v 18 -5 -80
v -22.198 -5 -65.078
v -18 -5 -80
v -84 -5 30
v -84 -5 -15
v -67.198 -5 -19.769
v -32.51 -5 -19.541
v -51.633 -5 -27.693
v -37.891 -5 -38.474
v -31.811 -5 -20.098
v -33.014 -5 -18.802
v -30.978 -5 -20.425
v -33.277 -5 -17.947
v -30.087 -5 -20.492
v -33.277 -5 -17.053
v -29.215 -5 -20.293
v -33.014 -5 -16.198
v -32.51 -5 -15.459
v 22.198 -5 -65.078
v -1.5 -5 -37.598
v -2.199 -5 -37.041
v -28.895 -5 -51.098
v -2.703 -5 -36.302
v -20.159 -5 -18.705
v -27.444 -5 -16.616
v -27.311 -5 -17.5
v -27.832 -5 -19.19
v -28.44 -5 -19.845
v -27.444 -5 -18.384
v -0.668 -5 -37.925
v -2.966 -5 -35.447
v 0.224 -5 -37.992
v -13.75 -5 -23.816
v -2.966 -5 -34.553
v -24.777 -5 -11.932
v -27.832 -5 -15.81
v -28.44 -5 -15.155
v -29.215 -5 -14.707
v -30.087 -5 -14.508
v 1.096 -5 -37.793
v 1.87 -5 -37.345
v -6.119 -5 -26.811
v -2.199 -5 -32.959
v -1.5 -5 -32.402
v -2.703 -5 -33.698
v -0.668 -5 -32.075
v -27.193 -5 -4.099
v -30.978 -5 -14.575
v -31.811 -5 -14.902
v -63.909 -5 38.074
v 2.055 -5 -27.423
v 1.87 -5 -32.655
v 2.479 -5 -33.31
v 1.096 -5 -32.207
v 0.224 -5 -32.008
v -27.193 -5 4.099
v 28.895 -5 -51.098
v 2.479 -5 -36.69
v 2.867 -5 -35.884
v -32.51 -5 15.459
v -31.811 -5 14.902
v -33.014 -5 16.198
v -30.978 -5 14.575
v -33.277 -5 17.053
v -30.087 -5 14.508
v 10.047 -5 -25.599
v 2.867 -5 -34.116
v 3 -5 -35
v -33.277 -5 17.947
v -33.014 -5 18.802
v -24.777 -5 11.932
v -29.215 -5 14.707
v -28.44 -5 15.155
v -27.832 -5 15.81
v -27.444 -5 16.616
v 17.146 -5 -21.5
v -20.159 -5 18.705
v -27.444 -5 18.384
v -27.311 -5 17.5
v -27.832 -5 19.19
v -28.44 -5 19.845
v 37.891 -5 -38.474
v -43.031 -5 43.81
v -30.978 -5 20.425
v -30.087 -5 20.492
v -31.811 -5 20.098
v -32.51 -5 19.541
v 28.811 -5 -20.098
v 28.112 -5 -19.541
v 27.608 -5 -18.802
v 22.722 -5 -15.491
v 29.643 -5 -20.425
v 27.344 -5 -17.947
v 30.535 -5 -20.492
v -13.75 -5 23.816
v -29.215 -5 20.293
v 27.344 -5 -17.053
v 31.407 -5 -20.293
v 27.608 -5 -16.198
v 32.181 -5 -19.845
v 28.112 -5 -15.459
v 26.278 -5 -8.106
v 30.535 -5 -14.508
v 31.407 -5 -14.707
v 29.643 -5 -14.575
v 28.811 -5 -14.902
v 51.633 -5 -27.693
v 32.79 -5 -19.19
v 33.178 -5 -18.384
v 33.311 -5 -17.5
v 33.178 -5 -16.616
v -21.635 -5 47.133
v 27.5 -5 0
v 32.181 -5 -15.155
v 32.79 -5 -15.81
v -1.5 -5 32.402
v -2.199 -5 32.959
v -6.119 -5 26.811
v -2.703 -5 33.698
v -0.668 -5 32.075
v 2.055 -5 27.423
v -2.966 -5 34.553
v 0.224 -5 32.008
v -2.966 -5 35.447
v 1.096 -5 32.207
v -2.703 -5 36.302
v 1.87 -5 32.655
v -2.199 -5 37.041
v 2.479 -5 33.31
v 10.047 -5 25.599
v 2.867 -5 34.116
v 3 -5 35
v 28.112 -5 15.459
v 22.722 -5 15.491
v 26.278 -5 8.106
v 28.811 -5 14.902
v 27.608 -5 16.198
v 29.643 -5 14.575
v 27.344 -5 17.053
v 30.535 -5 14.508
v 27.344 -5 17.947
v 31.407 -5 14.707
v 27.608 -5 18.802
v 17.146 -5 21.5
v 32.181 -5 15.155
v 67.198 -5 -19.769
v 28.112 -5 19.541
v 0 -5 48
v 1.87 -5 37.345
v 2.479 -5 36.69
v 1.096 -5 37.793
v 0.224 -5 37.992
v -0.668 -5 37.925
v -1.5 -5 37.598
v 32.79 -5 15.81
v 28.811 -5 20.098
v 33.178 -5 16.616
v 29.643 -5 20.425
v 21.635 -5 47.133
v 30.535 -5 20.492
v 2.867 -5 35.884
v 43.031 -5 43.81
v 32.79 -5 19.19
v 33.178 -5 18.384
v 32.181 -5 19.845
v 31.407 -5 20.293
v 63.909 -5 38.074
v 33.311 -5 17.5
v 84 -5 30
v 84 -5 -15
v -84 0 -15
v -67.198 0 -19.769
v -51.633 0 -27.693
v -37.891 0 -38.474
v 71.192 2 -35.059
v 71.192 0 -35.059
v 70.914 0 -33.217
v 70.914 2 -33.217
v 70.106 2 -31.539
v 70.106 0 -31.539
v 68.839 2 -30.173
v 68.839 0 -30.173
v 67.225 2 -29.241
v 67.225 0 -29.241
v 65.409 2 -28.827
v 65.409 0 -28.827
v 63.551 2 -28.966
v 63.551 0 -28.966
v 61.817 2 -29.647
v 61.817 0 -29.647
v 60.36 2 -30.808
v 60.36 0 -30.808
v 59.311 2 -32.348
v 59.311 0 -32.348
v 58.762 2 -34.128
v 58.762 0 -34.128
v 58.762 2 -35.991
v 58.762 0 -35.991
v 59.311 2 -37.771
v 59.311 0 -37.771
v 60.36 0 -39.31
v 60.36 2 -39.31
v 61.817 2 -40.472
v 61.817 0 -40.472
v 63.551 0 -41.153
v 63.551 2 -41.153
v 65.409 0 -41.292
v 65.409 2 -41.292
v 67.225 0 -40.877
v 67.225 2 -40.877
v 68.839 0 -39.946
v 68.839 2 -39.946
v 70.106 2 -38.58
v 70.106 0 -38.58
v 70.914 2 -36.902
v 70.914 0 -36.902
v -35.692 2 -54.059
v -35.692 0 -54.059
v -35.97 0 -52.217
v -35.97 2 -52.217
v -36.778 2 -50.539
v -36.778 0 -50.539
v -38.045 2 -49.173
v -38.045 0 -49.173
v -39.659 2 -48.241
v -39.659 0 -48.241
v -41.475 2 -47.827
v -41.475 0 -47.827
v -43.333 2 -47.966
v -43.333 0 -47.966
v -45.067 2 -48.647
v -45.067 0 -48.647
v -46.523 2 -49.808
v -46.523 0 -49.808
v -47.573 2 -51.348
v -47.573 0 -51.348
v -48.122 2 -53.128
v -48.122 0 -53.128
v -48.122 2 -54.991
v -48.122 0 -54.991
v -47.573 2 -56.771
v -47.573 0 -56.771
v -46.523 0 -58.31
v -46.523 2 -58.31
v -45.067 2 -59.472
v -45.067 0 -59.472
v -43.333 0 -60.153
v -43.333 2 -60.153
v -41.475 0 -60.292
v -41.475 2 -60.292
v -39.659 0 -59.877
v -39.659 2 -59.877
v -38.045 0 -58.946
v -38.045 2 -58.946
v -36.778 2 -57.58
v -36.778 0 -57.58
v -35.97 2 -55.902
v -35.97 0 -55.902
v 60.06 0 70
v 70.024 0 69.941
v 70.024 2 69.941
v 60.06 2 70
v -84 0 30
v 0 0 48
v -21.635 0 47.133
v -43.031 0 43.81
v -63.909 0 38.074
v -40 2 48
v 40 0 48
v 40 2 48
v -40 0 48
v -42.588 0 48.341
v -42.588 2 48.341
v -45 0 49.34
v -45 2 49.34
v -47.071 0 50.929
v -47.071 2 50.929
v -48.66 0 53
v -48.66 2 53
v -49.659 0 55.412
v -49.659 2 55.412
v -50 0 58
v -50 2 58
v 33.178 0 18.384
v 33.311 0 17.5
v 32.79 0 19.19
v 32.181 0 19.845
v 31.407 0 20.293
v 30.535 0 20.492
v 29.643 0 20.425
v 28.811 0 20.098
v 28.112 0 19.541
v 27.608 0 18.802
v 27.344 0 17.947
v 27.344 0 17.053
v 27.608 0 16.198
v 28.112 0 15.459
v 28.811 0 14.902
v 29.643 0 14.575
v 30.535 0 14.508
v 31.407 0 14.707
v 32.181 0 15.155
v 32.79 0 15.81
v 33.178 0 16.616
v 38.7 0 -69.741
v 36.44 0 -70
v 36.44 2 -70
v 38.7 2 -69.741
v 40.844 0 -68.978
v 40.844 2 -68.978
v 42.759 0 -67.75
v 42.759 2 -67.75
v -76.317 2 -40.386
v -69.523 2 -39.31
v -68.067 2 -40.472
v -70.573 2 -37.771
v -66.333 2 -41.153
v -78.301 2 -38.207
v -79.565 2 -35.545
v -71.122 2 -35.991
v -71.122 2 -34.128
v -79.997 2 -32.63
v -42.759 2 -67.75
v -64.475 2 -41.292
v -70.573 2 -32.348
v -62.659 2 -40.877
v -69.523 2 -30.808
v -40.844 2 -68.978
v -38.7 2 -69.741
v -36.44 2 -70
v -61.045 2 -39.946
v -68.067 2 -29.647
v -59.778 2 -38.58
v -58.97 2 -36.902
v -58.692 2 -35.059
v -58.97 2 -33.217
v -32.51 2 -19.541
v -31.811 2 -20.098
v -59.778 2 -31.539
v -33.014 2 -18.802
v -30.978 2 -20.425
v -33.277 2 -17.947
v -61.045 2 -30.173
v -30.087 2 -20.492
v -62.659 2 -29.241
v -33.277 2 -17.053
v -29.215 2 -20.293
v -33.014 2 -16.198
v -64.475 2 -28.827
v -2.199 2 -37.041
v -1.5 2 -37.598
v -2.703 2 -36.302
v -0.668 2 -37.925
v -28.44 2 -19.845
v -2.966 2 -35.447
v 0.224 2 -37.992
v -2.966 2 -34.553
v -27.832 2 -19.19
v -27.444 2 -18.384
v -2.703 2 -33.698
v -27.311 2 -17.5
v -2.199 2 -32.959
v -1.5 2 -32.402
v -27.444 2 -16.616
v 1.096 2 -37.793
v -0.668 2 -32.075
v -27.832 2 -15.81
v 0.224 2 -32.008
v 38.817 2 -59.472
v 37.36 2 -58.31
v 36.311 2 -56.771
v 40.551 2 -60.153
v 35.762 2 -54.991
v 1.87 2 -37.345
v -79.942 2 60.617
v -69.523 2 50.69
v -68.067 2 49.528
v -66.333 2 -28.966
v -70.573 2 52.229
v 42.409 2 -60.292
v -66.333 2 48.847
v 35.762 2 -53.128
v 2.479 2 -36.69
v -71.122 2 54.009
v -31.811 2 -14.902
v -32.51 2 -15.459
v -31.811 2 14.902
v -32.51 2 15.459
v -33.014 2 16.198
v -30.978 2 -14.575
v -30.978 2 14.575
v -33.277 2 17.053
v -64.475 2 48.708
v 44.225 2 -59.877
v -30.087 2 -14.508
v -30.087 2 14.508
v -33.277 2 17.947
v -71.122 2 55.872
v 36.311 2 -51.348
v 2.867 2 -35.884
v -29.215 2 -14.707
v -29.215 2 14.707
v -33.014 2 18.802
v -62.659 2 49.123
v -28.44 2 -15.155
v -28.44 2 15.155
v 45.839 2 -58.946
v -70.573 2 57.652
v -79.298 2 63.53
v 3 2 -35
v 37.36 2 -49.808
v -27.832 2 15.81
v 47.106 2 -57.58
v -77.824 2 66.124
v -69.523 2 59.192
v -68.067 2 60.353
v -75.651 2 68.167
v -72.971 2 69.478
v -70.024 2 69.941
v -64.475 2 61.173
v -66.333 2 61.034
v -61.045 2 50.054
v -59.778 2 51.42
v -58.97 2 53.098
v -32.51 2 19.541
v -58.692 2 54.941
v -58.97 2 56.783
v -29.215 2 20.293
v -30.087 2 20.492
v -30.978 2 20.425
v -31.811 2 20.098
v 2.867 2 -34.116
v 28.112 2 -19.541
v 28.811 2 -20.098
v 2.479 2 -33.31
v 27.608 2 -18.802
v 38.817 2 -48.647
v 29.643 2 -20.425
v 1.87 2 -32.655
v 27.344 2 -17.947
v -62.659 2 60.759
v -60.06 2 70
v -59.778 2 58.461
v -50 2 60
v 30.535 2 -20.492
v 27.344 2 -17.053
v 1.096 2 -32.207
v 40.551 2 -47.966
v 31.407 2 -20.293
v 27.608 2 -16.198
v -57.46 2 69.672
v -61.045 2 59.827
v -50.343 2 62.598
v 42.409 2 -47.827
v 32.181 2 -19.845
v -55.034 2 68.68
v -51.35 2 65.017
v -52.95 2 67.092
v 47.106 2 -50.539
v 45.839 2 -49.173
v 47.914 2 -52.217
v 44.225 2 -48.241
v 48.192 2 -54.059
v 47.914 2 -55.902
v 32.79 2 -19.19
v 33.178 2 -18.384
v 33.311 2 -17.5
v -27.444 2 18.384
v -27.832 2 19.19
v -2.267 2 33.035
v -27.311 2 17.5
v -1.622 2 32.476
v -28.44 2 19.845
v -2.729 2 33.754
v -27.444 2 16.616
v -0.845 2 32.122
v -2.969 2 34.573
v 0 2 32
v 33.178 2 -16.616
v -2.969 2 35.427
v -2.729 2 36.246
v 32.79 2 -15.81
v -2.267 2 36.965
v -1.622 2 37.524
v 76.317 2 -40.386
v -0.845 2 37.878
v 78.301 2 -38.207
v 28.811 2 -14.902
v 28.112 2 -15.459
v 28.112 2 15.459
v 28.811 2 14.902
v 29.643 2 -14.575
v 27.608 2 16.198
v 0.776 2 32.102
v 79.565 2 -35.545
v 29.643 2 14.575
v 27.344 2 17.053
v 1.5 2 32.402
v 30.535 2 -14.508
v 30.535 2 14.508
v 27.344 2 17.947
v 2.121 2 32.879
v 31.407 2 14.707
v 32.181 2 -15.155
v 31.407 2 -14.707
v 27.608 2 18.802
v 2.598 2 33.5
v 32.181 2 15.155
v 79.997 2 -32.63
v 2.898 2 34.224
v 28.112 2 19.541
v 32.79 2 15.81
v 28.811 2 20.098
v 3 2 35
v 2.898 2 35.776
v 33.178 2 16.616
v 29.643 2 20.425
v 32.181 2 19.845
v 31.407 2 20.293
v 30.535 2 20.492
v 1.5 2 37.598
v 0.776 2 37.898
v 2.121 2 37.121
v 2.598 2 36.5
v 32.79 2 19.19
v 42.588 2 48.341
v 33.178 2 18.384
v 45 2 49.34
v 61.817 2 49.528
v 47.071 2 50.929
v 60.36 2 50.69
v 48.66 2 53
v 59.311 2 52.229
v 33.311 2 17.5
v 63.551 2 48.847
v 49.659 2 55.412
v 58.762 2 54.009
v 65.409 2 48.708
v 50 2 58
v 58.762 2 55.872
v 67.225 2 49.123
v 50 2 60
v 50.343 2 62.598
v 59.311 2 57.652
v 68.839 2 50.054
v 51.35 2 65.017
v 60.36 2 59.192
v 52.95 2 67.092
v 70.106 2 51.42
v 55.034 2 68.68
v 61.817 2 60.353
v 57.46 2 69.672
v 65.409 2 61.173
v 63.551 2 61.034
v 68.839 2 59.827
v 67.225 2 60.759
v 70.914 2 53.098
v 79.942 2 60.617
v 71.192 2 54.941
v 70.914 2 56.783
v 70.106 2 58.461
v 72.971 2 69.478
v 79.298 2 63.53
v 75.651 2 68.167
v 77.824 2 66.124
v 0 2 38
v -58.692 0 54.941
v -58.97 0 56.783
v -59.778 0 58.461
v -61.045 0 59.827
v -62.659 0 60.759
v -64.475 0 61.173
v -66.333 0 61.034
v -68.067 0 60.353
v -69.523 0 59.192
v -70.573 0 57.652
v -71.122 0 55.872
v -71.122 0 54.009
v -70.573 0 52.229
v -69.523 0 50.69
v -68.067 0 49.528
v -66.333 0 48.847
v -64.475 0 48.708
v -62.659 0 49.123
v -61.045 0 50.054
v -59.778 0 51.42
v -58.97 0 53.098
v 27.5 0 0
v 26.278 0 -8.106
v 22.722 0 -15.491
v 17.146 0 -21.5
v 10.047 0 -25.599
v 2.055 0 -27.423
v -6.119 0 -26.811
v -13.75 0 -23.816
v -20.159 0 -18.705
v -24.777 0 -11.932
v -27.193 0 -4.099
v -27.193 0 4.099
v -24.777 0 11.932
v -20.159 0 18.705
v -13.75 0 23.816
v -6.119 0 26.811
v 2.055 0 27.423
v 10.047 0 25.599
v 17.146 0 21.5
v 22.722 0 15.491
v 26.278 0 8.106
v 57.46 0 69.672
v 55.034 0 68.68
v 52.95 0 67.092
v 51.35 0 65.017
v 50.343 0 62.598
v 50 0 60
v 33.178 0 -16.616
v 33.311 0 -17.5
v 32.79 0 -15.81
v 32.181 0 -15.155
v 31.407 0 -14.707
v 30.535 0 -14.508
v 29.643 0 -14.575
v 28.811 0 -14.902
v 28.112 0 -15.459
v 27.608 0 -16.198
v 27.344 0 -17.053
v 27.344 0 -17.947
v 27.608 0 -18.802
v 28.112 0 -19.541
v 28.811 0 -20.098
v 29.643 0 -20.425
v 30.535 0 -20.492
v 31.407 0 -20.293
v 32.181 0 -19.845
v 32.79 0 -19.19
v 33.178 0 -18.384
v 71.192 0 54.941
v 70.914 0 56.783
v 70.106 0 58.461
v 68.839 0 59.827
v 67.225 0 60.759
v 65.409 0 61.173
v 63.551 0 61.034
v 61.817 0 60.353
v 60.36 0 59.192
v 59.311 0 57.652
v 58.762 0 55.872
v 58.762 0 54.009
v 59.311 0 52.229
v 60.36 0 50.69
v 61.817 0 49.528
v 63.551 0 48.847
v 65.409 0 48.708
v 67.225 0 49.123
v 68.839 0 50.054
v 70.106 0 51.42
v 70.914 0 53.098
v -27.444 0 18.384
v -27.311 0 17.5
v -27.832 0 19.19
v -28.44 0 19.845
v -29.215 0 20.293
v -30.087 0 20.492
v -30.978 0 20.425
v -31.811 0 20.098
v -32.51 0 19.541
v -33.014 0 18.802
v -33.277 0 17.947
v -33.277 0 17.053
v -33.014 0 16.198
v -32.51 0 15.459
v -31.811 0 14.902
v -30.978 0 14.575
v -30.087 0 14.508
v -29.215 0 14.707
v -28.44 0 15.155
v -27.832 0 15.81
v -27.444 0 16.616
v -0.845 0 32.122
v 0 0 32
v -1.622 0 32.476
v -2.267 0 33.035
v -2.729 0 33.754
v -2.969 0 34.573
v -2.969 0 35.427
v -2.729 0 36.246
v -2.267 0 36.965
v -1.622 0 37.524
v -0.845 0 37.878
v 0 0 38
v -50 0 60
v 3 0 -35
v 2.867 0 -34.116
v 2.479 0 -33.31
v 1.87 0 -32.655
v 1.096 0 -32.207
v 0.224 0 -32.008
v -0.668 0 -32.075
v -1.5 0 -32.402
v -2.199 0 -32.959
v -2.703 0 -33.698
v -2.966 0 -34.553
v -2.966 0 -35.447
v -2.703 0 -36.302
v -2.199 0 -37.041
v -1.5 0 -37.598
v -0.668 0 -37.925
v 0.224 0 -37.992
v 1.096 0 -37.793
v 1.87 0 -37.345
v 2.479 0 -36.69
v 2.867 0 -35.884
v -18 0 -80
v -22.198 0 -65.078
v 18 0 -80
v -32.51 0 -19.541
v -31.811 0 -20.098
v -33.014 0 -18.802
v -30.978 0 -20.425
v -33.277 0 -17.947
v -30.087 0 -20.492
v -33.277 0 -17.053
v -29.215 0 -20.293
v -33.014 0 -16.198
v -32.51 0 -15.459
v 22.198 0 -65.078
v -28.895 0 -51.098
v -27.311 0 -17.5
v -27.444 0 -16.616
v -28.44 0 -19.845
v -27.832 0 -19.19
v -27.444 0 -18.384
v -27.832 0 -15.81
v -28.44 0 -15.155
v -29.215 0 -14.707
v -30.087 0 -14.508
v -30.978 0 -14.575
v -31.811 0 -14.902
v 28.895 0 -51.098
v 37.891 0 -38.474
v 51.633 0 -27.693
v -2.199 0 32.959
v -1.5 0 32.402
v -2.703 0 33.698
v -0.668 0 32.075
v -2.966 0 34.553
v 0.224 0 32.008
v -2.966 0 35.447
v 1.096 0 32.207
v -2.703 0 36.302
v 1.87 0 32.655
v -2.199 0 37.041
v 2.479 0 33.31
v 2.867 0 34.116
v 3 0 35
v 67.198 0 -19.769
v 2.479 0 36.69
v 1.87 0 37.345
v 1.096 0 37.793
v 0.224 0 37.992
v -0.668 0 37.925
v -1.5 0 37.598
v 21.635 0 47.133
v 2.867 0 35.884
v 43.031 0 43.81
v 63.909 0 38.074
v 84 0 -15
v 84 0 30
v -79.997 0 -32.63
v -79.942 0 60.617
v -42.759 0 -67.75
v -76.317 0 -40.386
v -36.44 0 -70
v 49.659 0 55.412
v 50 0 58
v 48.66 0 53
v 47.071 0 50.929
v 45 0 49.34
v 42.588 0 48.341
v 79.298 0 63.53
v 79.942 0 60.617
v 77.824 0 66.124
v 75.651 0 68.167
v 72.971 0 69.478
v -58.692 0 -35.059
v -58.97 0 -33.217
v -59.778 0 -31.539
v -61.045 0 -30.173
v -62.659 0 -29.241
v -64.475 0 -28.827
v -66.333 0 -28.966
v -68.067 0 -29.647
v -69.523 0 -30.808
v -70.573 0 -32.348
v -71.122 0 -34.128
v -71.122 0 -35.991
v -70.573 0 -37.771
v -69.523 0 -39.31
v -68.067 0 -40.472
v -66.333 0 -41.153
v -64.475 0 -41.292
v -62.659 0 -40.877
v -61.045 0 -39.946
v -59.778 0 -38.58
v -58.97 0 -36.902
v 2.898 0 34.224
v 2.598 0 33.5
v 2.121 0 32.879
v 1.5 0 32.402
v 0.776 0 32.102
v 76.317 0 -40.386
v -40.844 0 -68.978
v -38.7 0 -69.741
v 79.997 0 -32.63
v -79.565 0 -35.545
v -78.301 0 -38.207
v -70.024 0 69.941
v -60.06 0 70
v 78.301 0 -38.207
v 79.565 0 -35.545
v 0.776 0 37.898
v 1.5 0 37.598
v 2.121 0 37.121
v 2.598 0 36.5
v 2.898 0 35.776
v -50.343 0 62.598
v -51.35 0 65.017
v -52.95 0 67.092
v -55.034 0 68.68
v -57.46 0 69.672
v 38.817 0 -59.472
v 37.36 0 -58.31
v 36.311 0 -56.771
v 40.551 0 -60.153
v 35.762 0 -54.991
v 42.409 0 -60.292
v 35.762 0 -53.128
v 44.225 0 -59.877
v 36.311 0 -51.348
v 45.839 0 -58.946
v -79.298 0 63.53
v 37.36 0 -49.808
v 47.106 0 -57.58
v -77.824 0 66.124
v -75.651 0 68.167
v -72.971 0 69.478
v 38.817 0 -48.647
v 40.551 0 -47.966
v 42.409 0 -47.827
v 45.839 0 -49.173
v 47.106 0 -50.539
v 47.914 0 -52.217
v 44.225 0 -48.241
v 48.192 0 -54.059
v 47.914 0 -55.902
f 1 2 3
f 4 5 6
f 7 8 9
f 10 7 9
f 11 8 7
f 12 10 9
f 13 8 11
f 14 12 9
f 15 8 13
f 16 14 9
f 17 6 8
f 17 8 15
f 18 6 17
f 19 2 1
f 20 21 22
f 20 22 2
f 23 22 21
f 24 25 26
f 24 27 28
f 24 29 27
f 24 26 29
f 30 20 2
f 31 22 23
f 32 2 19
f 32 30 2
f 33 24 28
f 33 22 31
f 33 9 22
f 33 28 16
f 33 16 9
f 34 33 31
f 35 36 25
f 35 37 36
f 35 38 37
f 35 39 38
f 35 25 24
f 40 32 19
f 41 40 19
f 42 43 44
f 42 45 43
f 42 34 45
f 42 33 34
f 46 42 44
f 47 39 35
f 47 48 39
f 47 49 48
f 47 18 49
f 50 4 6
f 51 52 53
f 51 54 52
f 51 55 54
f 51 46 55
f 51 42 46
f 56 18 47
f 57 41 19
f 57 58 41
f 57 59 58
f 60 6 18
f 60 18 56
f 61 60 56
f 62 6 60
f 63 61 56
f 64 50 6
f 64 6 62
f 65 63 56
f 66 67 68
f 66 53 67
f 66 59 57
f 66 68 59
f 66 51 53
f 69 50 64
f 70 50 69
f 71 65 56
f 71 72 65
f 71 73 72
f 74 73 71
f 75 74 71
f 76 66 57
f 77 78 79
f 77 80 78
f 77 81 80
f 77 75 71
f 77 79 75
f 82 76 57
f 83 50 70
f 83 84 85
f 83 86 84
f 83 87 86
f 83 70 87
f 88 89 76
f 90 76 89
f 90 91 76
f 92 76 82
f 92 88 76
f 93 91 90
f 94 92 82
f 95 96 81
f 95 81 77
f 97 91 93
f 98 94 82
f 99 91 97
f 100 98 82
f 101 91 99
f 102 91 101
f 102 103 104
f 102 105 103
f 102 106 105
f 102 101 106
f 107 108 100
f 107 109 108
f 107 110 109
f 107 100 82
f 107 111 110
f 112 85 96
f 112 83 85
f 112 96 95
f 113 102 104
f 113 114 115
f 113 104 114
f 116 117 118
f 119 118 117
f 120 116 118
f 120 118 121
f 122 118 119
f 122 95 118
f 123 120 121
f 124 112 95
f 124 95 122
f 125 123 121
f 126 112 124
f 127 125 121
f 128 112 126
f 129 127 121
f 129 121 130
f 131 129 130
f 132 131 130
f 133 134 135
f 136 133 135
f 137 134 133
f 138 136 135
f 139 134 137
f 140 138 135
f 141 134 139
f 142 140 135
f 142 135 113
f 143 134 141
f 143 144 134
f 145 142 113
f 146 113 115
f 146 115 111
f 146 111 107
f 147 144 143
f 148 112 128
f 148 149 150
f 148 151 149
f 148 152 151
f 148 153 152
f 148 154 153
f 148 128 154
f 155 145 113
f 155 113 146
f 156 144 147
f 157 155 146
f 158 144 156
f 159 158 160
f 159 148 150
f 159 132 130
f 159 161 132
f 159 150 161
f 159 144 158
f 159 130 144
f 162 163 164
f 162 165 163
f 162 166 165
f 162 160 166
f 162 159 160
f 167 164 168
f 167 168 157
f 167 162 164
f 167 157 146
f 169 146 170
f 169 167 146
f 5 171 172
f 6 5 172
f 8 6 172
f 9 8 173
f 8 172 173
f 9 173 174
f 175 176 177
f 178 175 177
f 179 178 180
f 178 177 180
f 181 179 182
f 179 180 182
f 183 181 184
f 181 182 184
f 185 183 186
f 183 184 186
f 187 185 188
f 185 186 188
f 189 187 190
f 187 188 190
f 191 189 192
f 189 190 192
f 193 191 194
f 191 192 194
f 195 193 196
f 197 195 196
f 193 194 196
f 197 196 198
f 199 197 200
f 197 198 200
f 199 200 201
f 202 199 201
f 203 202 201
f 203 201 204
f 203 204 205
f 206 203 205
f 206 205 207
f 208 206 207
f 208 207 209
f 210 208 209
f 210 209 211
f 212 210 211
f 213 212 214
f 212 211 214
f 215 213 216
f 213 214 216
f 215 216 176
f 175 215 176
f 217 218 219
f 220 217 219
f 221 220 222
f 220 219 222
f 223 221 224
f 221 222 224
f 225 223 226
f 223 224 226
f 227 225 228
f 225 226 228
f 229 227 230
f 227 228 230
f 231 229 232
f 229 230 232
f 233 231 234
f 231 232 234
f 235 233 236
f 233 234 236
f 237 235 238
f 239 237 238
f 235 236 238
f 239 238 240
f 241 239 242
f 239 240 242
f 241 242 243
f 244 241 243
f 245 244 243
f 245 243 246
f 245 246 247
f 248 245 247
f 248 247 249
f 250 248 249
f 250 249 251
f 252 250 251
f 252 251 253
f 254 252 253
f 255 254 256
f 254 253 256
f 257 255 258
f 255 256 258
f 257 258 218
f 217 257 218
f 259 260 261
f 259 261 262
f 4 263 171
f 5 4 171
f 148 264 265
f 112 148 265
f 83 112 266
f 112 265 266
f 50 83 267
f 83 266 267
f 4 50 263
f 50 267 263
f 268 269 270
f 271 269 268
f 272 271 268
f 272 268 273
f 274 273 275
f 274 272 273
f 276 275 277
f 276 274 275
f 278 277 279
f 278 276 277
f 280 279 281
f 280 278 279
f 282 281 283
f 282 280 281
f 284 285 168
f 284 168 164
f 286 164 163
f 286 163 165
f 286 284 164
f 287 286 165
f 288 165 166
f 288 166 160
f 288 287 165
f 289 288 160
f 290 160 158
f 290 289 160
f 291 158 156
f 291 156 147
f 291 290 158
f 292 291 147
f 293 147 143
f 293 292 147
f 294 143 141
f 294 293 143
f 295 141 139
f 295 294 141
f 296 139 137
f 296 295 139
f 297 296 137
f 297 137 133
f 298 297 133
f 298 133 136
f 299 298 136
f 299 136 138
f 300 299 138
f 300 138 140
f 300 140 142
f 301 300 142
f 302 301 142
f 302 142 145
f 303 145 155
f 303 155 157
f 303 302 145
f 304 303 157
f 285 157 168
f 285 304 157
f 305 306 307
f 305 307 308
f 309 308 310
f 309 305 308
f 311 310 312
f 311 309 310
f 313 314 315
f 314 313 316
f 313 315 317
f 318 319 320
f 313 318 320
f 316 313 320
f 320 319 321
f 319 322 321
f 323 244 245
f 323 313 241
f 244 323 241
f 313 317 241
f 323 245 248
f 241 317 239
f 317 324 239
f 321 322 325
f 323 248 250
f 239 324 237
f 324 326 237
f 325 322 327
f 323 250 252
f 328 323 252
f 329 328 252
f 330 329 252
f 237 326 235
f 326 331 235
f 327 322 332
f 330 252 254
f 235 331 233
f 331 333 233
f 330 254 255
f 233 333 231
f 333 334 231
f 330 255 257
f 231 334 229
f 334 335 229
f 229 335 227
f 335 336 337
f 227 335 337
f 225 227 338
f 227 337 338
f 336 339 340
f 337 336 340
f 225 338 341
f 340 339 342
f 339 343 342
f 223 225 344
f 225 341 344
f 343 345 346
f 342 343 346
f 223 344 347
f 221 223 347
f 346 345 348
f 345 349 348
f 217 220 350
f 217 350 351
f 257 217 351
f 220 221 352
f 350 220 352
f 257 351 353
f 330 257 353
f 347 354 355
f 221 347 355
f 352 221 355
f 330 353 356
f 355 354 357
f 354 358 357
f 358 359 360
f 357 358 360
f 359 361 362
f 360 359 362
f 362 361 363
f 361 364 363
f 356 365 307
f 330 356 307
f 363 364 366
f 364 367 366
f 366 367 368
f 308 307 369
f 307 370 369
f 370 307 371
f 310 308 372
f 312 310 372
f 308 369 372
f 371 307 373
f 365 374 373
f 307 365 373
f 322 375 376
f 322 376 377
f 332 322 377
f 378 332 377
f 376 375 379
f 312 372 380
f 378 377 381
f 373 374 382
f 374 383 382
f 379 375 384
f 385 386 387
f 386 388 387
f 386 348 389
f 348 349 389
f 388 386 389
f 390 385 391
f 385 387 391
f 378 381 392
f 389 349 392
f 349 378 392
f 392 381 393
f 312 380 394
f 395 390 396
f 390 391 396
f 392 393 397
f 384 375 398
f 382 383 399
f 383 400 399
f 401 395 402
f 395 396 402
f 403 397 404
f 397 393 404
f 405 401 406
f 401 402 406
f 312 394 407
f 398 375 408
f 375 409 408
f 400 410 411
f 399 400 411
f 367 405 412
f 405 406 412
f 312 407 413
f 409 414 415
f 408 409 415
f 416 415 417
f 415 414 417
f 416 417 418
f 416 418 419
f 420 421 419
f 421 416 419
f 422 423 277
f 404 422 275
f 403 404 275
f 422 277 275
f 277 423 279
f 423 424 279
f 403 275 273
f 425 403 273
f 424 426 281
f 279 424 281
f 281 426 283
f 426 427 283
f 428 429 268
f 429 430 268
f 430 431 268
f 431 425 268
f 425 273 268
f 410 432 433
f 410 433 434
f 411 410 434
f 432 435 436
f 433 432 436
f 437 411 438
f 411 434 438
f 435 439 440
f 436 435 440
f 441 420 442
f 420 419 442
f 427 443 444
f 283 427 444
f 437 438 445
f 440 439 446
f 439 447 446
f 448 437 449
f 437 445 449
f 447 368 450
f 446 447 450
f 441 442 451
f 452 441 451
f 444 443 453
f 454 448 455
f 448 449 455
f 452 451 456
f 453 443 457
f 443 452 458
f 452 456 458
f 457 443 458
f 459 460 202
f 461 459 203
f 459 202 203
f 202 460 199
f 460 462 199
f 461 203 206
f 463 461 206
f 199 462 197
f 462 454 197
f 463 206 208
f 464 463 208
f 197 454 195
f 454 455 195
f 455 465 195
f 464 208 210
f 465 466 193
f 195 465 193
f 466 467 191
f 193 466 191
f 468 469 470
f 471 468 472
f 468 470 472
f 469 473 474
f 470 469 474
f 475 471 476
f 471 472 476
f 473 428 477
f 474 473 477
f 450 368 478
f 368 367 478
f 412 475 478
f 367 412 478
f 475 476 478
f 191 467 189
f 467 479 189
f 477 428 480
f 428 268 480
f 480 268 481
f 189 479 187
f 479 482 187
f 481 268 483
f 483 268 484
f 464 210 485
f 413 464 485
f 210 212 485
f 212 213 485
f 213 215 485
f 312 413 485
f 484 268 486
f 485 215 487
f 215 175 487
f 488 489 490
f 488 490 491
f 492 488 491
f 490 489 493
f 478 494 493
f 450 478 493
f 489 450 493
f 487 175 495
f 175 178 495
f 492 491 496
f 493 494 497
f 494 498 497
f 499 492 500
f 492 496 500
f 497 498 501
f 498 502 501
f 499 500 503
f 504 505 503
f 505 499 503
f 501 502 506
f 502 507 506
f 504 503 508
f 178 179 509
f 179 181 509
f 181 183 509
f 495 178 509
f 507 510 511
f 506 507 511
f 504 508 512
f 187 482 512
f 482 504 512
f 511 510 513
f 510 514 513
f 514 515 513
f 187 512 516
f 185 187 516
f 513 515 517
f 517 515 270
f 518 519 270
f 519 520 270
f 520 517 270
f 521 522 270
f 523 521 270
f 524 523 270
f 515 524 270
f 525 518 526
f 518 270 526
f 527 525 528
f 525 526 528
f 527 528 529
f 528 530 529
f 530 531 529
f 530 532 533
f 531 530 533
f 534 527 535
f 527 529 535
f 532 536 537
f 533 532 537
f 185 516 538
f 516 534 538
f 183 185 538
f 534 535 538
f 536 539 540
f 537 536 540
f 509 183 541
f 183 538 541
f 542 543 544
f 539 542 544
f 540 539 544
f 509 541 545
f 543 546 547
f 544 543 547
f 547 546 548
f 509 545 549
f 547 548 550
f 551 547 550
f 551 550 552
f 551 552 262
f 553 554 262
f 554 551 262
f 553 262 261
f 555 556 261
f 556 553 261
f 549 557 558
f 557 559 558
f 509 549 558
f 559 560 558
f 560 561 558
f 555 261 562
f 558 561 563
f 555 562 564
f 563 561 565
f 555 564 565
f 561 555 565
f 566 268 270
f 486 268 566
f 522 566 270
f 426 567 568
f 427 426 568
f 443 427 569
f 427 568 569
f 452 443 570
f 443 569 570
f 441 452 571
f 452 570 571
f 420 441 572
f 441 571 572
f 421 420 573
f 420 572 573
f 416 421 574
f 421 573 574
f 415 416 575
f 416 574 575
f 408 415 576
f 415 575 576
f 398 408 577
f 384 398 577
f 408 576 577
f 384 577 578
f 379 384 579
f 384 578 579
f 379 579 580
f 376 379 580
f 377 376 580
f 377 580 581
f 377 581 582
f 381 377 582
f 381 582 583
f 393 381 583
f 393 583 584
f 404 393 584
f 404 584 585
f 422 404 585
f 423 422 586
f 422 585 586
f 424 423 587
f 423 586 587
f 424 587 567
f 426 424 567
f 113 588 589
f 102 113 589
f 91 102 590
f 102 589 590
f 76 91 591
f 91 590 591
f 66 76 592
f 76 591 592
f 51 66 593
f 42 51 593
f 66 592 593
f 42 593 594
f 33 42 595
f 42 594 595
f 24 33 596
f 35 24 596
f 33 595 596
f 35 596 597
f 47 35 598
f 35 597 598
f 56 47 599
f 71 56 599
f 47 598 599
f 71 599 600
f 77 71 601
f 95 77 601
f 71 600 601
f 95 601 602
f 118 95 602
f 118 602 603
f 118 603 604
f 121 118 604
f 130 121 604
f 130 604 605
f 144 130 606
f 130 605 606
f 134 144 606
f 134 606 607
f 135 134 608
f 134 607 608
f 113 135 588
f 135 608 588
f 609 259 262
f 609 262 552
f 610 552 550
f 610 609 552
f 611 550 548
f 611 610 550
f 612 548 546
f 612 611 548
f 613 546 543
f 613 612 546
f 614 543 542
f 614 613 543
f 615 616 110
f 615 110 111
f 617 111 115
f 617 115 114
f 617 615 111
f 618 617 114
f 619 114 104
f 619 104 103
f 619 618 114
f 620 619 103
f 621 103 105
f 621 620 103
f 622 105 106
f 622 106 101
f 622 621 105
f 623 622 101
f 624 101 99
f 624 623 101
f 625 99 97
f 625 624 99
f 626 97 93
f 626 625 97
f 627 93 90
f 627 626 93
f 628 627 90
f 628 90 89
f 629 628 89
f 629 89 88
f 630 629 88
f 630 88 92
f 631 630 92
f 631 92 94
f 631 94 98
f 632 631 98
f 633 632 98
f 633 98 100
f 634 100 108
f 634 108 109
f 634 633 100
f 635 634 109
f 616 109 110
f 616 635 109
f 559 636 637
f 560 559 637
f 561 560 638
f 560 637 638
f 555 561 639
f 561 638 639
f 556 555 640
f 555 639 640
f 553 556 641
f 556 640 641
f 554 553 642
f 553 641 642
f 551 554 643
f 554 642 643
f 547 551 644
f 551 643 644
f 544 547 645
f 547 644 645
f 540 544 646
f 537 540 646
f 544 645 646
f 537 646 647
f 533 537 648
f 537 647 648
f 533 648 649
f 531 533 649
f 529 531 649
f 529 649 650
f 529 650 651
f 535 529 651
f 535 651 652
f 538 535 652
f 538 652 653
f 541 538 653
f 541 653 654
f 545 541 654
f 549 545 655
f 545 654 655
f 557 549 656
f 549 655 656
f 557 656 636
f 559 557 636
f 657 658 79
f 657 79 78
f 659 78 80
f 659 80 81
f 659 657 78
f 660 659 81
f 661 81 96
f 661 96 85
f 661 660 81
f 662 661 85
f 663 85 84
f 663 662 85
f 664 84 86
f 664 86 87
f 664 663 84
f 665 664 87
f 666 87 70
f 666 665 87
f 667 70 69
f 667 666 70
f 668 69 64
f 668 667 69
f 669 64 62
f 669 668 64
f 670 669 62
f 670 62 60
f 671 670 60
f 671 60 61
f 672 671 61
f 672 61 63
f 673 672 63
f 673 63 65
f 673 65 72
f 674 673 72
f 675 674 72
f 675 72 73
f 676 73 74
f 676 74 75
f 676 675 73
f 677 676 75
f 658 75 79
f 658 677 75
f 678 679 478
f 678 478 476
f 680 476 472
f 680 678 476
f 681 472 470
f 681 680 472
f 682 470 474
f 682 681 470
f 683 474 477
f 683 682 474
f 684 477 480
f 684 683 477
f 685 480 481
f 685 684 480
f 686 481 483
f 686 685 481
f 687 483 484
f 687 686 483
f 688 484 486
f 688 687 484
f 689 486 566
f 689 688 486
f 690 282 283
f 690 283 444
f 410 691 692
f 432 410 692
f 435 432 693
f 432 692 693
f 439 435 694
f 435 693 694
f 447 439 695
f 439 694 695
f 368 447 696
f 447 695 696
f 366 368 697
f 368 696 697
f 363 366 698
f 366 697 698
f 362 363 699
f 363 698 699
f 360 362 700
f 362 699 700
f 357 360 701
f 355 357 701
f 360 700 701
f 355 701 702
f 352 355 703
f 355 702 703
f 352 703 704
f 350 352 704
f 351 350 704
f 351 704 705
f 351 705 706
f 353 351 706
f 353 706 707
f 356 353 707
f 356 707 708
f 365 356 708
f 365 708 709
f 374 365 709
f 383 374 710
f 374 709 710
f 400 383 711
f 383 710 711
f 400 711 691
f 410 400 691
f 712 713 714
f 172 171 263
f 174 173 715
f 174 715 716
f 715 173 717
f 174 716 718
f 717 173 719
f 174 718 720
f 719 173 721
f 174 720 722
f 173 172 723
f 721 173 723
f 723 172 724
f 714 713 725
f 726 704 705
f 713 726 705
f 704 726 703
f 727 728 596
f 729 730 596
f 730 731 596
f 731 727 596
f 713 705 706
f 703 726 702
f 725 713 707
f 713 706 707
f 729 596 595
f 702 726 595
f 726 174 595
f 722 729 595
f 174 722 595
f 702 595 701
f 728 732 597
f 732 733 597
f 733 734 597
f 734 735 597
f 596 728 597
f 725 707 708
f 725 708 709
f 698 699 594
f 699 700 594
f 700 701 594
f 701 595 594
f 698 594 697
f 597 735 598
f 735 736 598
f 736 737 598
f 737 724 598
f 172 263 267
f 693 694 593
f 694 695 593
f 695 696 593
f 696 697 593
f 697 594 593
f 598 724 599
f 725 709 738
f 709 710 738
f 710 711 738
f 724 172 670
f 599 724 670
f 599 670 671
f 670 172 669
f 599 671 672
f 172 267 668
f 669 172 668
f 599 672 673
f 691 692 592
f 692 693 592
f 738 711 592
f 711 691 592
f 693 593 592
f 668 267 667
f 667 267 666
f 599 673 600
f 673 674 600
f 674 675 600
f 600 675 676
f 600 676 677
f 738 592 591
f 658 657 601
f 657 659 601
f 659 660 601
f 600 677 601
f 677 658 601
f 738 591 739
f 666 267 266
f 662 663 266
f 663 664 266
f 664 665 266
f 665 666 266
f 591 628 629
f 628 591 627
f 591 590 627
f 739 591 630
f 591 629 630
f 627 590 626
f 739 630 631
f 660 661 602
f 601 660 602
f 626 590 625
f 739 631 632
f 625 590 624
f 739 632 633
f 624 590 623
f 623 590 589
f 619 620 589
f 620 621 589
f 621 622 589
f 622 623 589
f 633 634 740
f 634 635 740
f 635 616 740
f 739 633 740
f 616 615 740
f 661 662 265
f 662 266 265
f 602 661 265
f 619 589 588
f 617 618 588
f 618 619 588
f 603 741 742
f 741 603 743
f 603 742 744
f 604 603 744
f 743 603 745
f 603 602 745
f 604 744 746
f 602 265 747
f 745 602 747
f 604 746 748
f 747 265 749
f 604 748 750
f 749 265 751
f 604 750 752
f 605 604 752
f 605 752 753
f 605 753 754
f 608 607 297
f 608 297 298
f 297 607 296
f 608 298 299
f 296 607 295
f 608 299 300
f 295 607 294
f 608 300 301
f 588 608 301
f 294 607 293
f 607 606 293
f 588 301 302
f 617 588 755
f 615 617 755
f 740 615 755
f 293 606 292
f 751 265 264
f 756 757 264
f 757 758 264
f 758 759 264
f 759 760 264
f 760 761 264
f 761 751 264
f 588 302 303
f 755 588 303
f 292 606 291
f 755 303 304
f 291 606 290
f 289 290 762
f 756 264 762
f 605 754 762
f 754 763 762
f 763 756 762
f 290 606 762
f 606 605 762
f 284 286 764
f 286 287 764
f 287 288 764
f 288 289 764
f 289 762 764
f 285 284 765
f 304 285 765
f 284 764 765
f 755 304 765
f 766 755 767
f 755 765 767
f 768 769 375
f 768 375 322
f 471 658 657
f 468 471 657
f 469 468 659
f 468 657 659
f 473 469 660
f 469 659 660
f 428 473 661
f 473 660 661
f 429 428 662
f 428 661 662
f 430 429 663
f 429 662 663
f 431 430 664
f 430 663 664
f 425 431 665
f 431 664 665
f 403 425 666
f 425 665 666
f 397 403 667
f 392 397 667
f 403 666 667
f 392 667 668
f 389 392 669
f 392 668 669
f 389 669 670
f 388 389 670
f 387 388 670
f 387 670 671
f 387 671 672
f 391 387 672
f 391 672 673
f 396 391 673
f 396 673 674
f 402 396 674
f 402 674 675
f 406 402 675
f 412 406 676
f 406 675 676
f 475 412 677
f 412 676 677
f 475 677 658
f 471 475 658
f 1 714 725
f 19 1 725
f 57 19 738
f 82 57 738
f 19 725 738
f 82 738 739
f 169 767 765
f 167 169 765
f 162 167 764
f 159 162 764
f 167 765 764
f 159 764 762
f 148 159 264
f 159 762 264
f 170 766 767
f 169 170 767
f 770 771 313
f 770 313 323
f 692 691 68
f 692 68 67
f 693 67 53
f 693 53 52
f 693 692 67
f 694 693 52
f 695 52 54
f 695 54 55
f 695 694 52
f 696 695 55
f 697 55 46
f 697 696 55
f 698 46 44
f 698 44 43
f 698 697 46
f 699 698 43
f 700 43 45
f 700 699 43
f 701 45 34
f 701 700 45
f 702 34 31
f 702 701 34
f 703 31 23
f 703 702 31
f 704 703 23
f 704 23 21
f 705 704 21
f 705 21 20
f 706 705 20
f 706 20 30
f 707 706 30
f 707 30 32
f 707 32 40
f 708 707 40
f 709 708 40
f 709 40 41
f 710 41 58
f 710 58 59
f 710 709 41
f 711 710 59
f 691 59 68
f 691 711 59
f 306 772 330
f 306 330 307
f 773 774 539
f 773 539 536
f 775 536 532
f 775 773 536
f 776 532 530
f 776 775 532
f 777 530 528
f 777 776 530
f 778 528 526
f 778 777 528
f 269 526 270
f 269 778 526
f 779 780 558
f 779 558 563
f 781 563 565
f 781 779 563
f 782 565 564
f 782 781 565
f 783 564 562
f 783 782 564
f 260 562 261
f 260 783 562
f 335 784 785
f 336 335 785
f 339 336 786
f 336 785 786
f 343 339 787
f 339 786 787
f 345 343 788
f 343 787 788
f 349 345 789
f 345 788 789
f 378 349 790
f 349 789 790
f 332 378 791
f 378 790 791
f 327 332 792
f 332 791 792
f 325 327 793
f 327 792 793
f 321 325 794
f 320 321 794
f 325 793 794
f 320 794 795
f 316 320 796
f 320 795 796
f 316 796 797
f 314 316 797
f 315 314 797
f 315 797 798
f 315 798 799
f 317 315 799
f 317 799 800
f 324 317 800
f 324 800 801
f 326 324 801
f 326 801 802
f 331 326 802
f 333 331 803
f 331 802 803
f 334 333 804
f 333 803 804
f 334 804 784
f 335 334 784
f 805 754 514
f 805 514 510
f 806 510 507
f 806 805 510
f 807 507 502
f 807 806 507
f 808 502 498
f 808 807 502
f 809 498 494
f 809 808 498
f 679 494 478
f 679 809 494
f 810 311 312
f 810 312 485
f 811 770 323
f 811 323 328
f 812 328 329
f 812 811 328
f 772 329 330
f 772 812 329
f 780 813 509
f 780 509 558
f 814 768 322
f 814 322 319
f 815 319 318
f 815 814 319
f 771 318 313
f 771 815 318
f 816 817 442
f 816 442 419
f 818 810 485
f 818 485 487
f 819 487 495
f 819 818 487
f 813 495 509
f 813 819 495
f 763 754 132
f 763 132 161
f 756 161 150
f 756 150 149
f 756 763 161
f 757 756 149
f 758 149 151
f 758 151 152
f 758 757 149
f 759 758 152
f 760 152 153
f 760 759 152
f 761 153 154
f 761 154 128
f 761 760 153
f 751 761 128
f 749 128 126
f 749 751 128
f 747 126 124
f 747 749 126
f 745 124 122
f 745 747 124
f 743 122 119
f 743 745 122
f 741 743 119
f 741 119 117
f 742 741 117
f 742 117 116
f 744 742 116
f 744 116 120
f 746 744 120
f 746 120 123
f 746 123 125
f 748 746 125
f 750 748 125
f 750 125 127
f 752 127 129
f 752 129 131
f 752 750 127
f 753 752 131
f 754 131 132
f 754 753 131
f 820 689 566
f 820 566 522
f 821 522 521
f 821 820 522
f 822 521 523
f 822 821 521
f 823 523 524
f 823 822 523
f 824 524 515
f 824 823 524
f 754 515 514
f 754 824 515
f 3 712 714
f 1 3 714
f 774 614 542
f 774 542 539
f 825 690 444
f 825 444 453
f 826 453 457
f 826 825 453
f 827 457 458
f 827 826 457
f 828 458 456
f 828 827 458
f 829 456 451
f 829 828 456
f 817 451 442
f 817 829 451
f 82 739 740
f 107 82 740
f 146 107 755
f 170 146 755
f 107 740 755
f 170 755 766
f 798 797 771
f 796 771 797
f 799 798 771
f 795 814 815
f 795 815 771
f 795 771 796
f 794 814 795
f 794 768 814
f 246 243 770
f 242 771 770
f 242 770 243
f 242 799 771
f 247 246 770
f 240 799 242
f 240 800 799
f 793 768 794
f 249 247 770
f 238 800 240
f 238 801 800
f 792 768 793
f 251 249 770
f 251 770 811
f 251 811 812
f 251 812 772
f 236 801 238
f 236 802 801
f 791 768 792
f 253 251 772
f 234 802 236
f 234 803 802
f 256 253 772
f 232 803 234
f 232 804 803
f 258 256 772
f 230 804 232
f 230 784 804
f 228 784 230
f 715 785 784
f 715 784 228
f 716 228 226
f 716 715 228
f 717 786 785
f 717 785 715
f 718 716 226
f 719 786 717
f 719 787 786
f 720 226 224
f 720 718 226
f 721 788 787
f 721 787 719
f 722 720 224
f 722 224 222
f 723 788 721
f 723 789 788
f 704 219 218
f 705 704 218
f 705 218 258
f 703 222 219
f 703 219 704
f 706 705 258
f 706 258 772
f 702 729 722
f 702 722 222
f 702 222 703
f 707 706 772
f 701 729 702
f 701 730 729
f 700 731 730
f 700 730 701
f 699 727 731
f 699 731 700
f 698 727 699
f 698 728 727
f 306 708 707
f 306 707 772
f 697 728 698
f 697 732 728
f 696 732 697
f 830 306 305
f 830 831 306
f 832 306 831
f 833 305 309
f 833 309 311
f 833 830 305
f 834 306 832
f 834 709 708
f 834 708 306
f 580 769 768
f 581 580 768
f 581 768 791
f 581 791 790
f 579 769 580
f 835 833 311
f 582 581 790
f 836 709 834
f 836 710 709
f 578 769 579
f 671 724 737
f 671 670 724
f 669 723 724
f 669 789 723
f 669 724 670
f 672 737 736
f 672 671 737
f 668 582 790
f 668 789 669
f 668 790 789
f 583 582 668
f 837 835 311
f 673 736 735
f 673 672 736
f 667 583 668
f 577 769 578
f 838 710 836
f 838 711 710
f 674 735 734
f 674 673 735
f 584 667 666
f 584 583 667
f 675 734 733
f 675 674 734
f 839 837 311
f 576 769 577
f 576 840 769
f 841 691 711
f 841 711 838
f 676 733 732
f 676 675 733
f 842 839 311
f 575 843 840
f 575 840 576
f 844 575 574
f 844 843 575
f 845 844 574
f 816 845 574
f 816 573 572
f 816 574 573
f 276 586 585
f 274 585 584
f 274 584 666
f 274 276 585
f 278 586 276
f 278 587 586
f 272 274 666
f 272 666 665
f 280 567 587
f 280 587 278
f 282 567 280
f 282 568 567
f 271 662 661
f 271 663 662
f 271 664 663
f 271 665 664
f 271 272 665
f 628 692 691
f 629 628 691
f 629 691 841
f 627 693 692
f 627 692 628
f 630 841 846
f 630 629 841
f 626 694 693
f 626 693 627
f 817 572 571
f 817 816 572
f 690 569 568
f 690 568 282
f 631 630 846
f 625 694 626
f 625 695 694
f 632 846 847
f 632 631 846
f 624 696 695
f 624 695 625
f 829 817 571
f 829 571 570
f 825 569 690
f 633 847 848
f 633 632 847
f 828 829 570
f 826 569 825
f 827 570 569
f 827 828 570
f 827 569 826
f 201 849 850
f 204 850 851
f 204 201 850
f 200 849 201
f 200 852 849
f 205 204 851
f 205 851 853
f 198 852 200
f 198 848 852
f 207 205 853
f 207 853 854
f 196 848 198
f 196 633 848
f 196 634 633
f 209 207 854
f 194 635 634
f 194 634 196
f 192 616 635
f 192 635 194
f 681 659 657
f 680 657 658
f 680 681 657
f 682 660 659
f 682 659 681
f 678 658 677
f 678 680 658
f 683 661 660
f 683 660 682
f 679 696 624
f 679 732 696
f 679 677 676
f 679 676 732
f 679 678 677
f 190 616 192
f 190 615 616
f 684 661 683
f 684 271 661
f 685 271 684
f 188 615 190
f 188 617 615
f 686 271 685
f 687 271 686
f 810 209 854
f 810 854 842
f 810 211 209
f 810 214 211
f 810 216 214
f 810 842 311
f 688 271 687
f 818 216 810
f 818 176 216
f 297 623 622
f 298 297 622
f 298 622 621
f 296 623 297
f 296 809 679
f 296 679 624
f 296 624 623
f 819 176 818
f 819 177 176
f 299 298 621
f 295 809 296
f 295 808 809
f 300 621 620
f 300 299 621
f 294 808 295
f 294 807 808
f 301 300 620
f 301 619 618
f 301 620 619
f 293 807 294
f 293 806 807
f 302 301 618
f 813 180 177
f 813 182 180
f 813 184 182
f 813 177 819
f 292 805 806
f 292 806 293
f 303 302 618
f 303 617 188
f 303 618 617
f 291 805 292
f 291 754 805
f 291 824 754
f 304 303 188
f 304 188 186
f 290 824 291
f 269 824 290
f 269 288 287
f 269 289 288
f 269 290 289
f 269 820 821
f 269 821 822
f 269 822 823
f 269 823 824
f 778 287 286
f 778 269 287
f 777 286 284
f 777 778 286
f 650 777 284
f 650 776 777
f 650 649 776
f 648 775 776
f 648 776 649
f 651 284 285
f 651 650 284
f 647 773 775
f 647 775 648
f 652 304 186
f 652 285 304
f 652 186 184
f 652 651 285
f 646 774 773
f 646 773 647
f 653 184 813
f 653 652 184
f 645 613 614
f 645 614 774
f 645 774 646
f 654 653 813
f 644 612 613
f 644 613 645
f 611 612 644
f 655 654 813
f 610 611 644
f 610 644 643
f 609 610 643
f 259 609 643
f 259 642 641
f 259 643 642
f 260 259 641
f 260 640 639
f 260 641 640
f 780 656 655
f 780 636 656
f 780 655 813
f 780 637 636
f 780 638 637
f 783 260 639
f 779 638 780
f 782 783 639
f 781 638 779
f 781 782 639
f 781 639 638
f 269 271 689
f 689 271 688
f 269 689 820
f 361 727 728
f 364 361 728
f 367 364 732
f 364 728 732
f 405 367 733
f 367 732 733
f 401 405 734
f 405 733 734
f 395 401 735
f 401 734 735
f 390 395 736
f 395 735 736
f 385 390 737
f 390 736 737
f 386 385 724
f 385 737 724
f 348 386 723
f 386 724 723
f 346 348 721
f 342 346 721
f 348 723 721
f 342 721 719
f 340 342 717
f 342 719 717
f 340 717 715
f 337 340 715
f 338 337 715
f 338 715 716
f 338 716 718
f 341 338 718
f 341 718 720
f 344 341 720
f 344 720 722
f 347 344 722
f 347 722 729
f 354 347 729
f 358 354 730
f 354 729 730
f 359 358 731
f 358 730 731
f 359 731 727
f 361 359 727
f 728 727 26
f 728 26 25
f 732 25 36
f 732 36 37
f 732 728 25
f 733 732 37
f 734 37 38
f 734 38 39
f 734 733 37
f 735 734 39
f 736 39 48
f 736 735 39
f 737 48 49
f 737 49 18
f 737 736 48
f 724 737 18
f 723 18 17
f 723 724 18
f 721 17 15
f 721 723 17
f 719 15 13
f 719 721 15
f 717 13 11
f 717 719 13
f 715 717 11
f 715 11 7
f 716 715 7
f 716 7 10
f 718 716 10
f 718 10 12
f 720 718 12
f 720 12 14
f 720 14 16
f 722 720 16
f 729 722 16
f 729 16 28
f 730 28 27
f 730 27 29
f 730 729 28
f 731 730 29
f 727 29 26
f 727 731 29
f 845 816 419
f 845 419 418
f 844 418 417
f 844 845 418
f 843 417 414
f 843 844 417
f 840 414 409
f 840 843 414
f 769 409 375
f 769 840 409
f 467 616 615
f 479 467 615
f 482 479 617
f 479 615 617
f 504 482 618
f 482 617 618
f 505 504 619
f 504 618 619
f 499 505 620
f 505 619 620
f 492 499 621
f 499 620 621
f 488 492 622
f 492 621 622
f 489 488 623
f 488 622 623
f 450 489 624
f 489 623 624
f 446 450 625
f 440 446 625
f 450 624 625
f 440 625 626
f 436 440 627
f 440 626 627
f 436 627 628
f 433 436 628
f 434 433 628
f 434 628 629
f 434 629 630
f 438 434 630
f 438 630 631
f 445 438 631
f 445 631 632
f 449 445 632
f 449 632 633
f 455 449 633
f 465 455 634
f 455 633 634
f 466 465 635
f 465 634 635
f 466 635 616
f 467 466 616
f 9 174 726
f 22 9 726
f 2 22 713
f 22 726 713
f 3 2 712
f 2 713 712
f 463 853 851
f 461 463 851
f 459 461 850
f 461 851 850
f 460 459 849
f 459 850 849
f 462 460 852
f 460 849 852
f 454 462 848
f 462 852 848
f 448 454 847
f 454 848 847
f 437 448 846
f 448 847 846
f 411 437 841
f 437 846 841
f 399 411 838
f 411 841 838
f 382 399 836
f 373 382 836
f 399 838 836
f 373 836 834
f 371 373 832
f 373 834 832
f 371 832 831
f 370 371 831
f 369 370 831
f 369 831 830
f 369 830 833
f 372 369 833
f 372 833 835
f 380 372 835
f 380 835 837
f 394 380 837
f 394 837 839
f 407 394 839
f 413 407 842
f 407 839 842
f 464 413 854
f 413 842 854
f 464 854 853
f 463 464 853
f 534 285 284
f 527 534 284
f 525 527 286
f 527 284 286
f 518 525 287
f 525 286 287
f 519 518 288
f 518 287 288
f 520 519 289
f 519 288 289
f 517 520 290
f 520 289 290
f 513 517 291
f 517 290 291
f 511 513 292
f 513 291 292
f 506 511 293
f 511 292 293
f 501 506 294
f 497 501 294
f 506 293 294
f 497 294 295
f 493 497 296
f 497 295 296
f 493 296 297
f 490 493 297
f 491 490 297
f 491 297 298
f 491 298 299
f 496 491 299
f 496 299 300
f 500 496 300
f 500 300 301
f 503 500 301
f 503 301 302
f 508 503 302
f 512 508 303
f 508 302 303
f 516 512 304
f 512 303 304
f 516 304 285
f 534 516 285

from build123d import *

# Parameters (mm, degrees)
F0_R     = 3
F1_DEPTH = 5
F2_R     = 6.25
F2_R_2   = 3
F3_DEPTH = 2


# Not quite as in the source:
# - a feature names something its author has since deleted; it is built from what else it names


with BuildPart() as f1:
    # F0 (on Front) → F1 (new body)
    with BuildSketch(Plane.XZ):
        with BuildLine():
            ThreePointArc((18, -80), (25.2450835608, -57.9435000854), (37.8911830779, -38.474124356))
            ThreePointArc((37.8911830779, -38.474124356), (59.2223421632, -23.3521866114), (84, -15))
            Line((84, -15), (84, 30))
            ThreePointArc((84, 30), (43.0306603199, 43.8097481595), (0, 48))
            ThreePointArc((0, 48), (-43.0306603199, 43.8097481595), (-84, 30))
            Line((-84, 30), (-84, -15))
            ThreePointArc((-84, -15), (-59.2223421632, -23.3521866114), (-37.8911830779, -38.474124356))
            ThreePointArc((-37.8911830779, -38.474124356), (-25.2450835608, -57.9435000854), (-18, -80))
            Line((-18, -80), (0, -80))
            Line((0, -80), (18, -80))
        make_face()
        with Locations((-30.3108891325, -17.5)):
            Circle(F0_R, mode=Mode.SUBTRACT)
        with Locations((0, -35)):
            Circle(F0_R, mode=Mode.SUBTRACT)
        with Locations((30.3108891325, -17.5)):
            Circle(F0_R, mode=Mode.SUBTRACT)
        with Locations((-30.3108891325, 17.5)):
            Circle(F0_R, mode=Mode.SUBTRACT)
        with BuildLine():
            ThreePointArc((19.2964358267, -19.5933040702), (-25.3663358138, 10.6206877076), (27.5, 0))
            ThreePointArc((27.5, 0), (25.3663358138, -10.6206877076), (19.2964358267, -19.5933040702))
        make_face(mode=Mode.SUBTRACT)
        with Locations((30.3108891325, 17.5)):
            Circle(F0_R, mode=Mode.SUBTRACT)
        with Locations((0, 35)):
            Circle(F0_R, mode=Mode.SUBTRACT)
    extrude(amount=F1_DEPTH)


with BuildPart() as f3:
    # F2 (on Front) → F3 (new body)
    with BuildSketch(Plane.XZ):
        with BuildLine():
            Line((40, 48), (0, 48))
            Line((0, 48), (-40, 48))
            ThreePointArc((-40, 48), (-47.0710678119, 50.9289321881), (-50, 58))
            Line((-50, 58), (-50, 60.0001774362))
            ThreePointArc((-50, 60.0001774362), (-52.9500251451, 67.0922754718), (-60.0595709092, 70))
            Line((-60.0595709092, 70), (-70.0243862443, 69.9406376358))
            ThreePointArc((-70.0243862443, 69.9406376358), (-76.8142082584, 67.2268164845), (-79.9418990419, 60.6174247888))
            Line((-79.9418990419, 60.6174247888), (-79.9971823925, -32.6300462499))
            ThreePointArc((-79.9971823925, -32.6300462499), (-79.0316227544, -36.923039078), (-76.3168067264, -40.3859665636))
            Line((-76.3168067264, -40.3859665636), (-42.7592701532, -67.7499916446))
            ThreePointArc((-42.7592701532, -67.7499916446), (-39.7937557707, -69.4207196234), (-36.4396475767, -70))
            Line((-36.4396475767, -70), (0, -70))
            Line((0, -70), (36.4396475767, -70))
            ThreePointArc((36.4396475767, -70), (39.7937557707, -69.4207196234), (42.7592701532, -67.7499916446))
            Line((42.7592701532, -67.7499916446), (76.3168067264, -40.3859665636))
            ThreePointArc((76.3168067264, -40.3859665636), (79.0316227544, -36.923039078), (79.9971823925, -32.6300462499))
            Line((79.9971823925, -32.6300462499), (79.9418990419, 60.6174247888))
            ThreePointArc((79.9418990419, 60.6174247888), (76.8142082584, 67.2268164845), (70.0243862443, 69.9406376358))
            Line((70.0243862443, 69.9406376358), (60.0595709092, 70))
            ThreePointArc((60.0595709092, 70), (52.9500251451, 67.0922754718), (50, 60.0001774362))
            Line((50, 60.0001774362), (50, 58))
            ThreePointArc((50, 58), (47.0710678119, 50.9289321881), (40, 48))
        make_face()
        with Locations((-41.9418990419, -54.0593623642)):
            Circle(F2_R, mode=Mode.SUBTRACT)
        with Locations((-64.9418990419, -35.0593623642)):
            Circle(F2_R, mode=Mode.SUBTRACT)
        with Locations((-30.3108891325, -17.5)):
            Circle(F2_R_2, mode=Mode.SUBTRACT)
        with Locations((0, -35)):
            Circle(F2_R_2, mode=Mode.SUBTRACT)
        with Locations((41.9418990419, -54.0593623642)):
            Circle(F2_R, mode=Mode.SUBTRACT)
        with Locations((64.9418990419, -35.0593623642)):
            Circle(F2_R, mode=Mode.SUBTRACT)
        with Locations((30.3108891325, -17.5)):
            Circle(F2_R_2, mode=Mode.SUBTRACT)
        with Locations((-30.3108891325, 17.5)):
            Circle(F2_R_2, mode=Mode.SUBTRACT)
        with Locations((-64.9418990419, 54.9406376358)):
            Circle(F2_R, mode=Mode.SUBTRACT)
        with Locations((30.3108891325, 17.5)):
            Circle(F2_R_2, mode=Mode.SUBTRACT)
        with BuildLine():
            ThreePointArc((0, 32), (-3, 35), (0, 38))
            ThreePointArc((0, 38), (2.1213203436, 37.1213203436), (3, 35))
            ThreePointArc((3, 35), (2.1213203436, 32.8786796564), (0, 32))
        make_face(mode=Mode.SUBTRACT)
        with Locations((64.9418990419, 54.9406376358)):
            Circle(F2_R, mode=Mode.SUBTRACT)
    extrude(amount=-F3_DEPTH)


solid = Compound([f1.part, f3.part])
